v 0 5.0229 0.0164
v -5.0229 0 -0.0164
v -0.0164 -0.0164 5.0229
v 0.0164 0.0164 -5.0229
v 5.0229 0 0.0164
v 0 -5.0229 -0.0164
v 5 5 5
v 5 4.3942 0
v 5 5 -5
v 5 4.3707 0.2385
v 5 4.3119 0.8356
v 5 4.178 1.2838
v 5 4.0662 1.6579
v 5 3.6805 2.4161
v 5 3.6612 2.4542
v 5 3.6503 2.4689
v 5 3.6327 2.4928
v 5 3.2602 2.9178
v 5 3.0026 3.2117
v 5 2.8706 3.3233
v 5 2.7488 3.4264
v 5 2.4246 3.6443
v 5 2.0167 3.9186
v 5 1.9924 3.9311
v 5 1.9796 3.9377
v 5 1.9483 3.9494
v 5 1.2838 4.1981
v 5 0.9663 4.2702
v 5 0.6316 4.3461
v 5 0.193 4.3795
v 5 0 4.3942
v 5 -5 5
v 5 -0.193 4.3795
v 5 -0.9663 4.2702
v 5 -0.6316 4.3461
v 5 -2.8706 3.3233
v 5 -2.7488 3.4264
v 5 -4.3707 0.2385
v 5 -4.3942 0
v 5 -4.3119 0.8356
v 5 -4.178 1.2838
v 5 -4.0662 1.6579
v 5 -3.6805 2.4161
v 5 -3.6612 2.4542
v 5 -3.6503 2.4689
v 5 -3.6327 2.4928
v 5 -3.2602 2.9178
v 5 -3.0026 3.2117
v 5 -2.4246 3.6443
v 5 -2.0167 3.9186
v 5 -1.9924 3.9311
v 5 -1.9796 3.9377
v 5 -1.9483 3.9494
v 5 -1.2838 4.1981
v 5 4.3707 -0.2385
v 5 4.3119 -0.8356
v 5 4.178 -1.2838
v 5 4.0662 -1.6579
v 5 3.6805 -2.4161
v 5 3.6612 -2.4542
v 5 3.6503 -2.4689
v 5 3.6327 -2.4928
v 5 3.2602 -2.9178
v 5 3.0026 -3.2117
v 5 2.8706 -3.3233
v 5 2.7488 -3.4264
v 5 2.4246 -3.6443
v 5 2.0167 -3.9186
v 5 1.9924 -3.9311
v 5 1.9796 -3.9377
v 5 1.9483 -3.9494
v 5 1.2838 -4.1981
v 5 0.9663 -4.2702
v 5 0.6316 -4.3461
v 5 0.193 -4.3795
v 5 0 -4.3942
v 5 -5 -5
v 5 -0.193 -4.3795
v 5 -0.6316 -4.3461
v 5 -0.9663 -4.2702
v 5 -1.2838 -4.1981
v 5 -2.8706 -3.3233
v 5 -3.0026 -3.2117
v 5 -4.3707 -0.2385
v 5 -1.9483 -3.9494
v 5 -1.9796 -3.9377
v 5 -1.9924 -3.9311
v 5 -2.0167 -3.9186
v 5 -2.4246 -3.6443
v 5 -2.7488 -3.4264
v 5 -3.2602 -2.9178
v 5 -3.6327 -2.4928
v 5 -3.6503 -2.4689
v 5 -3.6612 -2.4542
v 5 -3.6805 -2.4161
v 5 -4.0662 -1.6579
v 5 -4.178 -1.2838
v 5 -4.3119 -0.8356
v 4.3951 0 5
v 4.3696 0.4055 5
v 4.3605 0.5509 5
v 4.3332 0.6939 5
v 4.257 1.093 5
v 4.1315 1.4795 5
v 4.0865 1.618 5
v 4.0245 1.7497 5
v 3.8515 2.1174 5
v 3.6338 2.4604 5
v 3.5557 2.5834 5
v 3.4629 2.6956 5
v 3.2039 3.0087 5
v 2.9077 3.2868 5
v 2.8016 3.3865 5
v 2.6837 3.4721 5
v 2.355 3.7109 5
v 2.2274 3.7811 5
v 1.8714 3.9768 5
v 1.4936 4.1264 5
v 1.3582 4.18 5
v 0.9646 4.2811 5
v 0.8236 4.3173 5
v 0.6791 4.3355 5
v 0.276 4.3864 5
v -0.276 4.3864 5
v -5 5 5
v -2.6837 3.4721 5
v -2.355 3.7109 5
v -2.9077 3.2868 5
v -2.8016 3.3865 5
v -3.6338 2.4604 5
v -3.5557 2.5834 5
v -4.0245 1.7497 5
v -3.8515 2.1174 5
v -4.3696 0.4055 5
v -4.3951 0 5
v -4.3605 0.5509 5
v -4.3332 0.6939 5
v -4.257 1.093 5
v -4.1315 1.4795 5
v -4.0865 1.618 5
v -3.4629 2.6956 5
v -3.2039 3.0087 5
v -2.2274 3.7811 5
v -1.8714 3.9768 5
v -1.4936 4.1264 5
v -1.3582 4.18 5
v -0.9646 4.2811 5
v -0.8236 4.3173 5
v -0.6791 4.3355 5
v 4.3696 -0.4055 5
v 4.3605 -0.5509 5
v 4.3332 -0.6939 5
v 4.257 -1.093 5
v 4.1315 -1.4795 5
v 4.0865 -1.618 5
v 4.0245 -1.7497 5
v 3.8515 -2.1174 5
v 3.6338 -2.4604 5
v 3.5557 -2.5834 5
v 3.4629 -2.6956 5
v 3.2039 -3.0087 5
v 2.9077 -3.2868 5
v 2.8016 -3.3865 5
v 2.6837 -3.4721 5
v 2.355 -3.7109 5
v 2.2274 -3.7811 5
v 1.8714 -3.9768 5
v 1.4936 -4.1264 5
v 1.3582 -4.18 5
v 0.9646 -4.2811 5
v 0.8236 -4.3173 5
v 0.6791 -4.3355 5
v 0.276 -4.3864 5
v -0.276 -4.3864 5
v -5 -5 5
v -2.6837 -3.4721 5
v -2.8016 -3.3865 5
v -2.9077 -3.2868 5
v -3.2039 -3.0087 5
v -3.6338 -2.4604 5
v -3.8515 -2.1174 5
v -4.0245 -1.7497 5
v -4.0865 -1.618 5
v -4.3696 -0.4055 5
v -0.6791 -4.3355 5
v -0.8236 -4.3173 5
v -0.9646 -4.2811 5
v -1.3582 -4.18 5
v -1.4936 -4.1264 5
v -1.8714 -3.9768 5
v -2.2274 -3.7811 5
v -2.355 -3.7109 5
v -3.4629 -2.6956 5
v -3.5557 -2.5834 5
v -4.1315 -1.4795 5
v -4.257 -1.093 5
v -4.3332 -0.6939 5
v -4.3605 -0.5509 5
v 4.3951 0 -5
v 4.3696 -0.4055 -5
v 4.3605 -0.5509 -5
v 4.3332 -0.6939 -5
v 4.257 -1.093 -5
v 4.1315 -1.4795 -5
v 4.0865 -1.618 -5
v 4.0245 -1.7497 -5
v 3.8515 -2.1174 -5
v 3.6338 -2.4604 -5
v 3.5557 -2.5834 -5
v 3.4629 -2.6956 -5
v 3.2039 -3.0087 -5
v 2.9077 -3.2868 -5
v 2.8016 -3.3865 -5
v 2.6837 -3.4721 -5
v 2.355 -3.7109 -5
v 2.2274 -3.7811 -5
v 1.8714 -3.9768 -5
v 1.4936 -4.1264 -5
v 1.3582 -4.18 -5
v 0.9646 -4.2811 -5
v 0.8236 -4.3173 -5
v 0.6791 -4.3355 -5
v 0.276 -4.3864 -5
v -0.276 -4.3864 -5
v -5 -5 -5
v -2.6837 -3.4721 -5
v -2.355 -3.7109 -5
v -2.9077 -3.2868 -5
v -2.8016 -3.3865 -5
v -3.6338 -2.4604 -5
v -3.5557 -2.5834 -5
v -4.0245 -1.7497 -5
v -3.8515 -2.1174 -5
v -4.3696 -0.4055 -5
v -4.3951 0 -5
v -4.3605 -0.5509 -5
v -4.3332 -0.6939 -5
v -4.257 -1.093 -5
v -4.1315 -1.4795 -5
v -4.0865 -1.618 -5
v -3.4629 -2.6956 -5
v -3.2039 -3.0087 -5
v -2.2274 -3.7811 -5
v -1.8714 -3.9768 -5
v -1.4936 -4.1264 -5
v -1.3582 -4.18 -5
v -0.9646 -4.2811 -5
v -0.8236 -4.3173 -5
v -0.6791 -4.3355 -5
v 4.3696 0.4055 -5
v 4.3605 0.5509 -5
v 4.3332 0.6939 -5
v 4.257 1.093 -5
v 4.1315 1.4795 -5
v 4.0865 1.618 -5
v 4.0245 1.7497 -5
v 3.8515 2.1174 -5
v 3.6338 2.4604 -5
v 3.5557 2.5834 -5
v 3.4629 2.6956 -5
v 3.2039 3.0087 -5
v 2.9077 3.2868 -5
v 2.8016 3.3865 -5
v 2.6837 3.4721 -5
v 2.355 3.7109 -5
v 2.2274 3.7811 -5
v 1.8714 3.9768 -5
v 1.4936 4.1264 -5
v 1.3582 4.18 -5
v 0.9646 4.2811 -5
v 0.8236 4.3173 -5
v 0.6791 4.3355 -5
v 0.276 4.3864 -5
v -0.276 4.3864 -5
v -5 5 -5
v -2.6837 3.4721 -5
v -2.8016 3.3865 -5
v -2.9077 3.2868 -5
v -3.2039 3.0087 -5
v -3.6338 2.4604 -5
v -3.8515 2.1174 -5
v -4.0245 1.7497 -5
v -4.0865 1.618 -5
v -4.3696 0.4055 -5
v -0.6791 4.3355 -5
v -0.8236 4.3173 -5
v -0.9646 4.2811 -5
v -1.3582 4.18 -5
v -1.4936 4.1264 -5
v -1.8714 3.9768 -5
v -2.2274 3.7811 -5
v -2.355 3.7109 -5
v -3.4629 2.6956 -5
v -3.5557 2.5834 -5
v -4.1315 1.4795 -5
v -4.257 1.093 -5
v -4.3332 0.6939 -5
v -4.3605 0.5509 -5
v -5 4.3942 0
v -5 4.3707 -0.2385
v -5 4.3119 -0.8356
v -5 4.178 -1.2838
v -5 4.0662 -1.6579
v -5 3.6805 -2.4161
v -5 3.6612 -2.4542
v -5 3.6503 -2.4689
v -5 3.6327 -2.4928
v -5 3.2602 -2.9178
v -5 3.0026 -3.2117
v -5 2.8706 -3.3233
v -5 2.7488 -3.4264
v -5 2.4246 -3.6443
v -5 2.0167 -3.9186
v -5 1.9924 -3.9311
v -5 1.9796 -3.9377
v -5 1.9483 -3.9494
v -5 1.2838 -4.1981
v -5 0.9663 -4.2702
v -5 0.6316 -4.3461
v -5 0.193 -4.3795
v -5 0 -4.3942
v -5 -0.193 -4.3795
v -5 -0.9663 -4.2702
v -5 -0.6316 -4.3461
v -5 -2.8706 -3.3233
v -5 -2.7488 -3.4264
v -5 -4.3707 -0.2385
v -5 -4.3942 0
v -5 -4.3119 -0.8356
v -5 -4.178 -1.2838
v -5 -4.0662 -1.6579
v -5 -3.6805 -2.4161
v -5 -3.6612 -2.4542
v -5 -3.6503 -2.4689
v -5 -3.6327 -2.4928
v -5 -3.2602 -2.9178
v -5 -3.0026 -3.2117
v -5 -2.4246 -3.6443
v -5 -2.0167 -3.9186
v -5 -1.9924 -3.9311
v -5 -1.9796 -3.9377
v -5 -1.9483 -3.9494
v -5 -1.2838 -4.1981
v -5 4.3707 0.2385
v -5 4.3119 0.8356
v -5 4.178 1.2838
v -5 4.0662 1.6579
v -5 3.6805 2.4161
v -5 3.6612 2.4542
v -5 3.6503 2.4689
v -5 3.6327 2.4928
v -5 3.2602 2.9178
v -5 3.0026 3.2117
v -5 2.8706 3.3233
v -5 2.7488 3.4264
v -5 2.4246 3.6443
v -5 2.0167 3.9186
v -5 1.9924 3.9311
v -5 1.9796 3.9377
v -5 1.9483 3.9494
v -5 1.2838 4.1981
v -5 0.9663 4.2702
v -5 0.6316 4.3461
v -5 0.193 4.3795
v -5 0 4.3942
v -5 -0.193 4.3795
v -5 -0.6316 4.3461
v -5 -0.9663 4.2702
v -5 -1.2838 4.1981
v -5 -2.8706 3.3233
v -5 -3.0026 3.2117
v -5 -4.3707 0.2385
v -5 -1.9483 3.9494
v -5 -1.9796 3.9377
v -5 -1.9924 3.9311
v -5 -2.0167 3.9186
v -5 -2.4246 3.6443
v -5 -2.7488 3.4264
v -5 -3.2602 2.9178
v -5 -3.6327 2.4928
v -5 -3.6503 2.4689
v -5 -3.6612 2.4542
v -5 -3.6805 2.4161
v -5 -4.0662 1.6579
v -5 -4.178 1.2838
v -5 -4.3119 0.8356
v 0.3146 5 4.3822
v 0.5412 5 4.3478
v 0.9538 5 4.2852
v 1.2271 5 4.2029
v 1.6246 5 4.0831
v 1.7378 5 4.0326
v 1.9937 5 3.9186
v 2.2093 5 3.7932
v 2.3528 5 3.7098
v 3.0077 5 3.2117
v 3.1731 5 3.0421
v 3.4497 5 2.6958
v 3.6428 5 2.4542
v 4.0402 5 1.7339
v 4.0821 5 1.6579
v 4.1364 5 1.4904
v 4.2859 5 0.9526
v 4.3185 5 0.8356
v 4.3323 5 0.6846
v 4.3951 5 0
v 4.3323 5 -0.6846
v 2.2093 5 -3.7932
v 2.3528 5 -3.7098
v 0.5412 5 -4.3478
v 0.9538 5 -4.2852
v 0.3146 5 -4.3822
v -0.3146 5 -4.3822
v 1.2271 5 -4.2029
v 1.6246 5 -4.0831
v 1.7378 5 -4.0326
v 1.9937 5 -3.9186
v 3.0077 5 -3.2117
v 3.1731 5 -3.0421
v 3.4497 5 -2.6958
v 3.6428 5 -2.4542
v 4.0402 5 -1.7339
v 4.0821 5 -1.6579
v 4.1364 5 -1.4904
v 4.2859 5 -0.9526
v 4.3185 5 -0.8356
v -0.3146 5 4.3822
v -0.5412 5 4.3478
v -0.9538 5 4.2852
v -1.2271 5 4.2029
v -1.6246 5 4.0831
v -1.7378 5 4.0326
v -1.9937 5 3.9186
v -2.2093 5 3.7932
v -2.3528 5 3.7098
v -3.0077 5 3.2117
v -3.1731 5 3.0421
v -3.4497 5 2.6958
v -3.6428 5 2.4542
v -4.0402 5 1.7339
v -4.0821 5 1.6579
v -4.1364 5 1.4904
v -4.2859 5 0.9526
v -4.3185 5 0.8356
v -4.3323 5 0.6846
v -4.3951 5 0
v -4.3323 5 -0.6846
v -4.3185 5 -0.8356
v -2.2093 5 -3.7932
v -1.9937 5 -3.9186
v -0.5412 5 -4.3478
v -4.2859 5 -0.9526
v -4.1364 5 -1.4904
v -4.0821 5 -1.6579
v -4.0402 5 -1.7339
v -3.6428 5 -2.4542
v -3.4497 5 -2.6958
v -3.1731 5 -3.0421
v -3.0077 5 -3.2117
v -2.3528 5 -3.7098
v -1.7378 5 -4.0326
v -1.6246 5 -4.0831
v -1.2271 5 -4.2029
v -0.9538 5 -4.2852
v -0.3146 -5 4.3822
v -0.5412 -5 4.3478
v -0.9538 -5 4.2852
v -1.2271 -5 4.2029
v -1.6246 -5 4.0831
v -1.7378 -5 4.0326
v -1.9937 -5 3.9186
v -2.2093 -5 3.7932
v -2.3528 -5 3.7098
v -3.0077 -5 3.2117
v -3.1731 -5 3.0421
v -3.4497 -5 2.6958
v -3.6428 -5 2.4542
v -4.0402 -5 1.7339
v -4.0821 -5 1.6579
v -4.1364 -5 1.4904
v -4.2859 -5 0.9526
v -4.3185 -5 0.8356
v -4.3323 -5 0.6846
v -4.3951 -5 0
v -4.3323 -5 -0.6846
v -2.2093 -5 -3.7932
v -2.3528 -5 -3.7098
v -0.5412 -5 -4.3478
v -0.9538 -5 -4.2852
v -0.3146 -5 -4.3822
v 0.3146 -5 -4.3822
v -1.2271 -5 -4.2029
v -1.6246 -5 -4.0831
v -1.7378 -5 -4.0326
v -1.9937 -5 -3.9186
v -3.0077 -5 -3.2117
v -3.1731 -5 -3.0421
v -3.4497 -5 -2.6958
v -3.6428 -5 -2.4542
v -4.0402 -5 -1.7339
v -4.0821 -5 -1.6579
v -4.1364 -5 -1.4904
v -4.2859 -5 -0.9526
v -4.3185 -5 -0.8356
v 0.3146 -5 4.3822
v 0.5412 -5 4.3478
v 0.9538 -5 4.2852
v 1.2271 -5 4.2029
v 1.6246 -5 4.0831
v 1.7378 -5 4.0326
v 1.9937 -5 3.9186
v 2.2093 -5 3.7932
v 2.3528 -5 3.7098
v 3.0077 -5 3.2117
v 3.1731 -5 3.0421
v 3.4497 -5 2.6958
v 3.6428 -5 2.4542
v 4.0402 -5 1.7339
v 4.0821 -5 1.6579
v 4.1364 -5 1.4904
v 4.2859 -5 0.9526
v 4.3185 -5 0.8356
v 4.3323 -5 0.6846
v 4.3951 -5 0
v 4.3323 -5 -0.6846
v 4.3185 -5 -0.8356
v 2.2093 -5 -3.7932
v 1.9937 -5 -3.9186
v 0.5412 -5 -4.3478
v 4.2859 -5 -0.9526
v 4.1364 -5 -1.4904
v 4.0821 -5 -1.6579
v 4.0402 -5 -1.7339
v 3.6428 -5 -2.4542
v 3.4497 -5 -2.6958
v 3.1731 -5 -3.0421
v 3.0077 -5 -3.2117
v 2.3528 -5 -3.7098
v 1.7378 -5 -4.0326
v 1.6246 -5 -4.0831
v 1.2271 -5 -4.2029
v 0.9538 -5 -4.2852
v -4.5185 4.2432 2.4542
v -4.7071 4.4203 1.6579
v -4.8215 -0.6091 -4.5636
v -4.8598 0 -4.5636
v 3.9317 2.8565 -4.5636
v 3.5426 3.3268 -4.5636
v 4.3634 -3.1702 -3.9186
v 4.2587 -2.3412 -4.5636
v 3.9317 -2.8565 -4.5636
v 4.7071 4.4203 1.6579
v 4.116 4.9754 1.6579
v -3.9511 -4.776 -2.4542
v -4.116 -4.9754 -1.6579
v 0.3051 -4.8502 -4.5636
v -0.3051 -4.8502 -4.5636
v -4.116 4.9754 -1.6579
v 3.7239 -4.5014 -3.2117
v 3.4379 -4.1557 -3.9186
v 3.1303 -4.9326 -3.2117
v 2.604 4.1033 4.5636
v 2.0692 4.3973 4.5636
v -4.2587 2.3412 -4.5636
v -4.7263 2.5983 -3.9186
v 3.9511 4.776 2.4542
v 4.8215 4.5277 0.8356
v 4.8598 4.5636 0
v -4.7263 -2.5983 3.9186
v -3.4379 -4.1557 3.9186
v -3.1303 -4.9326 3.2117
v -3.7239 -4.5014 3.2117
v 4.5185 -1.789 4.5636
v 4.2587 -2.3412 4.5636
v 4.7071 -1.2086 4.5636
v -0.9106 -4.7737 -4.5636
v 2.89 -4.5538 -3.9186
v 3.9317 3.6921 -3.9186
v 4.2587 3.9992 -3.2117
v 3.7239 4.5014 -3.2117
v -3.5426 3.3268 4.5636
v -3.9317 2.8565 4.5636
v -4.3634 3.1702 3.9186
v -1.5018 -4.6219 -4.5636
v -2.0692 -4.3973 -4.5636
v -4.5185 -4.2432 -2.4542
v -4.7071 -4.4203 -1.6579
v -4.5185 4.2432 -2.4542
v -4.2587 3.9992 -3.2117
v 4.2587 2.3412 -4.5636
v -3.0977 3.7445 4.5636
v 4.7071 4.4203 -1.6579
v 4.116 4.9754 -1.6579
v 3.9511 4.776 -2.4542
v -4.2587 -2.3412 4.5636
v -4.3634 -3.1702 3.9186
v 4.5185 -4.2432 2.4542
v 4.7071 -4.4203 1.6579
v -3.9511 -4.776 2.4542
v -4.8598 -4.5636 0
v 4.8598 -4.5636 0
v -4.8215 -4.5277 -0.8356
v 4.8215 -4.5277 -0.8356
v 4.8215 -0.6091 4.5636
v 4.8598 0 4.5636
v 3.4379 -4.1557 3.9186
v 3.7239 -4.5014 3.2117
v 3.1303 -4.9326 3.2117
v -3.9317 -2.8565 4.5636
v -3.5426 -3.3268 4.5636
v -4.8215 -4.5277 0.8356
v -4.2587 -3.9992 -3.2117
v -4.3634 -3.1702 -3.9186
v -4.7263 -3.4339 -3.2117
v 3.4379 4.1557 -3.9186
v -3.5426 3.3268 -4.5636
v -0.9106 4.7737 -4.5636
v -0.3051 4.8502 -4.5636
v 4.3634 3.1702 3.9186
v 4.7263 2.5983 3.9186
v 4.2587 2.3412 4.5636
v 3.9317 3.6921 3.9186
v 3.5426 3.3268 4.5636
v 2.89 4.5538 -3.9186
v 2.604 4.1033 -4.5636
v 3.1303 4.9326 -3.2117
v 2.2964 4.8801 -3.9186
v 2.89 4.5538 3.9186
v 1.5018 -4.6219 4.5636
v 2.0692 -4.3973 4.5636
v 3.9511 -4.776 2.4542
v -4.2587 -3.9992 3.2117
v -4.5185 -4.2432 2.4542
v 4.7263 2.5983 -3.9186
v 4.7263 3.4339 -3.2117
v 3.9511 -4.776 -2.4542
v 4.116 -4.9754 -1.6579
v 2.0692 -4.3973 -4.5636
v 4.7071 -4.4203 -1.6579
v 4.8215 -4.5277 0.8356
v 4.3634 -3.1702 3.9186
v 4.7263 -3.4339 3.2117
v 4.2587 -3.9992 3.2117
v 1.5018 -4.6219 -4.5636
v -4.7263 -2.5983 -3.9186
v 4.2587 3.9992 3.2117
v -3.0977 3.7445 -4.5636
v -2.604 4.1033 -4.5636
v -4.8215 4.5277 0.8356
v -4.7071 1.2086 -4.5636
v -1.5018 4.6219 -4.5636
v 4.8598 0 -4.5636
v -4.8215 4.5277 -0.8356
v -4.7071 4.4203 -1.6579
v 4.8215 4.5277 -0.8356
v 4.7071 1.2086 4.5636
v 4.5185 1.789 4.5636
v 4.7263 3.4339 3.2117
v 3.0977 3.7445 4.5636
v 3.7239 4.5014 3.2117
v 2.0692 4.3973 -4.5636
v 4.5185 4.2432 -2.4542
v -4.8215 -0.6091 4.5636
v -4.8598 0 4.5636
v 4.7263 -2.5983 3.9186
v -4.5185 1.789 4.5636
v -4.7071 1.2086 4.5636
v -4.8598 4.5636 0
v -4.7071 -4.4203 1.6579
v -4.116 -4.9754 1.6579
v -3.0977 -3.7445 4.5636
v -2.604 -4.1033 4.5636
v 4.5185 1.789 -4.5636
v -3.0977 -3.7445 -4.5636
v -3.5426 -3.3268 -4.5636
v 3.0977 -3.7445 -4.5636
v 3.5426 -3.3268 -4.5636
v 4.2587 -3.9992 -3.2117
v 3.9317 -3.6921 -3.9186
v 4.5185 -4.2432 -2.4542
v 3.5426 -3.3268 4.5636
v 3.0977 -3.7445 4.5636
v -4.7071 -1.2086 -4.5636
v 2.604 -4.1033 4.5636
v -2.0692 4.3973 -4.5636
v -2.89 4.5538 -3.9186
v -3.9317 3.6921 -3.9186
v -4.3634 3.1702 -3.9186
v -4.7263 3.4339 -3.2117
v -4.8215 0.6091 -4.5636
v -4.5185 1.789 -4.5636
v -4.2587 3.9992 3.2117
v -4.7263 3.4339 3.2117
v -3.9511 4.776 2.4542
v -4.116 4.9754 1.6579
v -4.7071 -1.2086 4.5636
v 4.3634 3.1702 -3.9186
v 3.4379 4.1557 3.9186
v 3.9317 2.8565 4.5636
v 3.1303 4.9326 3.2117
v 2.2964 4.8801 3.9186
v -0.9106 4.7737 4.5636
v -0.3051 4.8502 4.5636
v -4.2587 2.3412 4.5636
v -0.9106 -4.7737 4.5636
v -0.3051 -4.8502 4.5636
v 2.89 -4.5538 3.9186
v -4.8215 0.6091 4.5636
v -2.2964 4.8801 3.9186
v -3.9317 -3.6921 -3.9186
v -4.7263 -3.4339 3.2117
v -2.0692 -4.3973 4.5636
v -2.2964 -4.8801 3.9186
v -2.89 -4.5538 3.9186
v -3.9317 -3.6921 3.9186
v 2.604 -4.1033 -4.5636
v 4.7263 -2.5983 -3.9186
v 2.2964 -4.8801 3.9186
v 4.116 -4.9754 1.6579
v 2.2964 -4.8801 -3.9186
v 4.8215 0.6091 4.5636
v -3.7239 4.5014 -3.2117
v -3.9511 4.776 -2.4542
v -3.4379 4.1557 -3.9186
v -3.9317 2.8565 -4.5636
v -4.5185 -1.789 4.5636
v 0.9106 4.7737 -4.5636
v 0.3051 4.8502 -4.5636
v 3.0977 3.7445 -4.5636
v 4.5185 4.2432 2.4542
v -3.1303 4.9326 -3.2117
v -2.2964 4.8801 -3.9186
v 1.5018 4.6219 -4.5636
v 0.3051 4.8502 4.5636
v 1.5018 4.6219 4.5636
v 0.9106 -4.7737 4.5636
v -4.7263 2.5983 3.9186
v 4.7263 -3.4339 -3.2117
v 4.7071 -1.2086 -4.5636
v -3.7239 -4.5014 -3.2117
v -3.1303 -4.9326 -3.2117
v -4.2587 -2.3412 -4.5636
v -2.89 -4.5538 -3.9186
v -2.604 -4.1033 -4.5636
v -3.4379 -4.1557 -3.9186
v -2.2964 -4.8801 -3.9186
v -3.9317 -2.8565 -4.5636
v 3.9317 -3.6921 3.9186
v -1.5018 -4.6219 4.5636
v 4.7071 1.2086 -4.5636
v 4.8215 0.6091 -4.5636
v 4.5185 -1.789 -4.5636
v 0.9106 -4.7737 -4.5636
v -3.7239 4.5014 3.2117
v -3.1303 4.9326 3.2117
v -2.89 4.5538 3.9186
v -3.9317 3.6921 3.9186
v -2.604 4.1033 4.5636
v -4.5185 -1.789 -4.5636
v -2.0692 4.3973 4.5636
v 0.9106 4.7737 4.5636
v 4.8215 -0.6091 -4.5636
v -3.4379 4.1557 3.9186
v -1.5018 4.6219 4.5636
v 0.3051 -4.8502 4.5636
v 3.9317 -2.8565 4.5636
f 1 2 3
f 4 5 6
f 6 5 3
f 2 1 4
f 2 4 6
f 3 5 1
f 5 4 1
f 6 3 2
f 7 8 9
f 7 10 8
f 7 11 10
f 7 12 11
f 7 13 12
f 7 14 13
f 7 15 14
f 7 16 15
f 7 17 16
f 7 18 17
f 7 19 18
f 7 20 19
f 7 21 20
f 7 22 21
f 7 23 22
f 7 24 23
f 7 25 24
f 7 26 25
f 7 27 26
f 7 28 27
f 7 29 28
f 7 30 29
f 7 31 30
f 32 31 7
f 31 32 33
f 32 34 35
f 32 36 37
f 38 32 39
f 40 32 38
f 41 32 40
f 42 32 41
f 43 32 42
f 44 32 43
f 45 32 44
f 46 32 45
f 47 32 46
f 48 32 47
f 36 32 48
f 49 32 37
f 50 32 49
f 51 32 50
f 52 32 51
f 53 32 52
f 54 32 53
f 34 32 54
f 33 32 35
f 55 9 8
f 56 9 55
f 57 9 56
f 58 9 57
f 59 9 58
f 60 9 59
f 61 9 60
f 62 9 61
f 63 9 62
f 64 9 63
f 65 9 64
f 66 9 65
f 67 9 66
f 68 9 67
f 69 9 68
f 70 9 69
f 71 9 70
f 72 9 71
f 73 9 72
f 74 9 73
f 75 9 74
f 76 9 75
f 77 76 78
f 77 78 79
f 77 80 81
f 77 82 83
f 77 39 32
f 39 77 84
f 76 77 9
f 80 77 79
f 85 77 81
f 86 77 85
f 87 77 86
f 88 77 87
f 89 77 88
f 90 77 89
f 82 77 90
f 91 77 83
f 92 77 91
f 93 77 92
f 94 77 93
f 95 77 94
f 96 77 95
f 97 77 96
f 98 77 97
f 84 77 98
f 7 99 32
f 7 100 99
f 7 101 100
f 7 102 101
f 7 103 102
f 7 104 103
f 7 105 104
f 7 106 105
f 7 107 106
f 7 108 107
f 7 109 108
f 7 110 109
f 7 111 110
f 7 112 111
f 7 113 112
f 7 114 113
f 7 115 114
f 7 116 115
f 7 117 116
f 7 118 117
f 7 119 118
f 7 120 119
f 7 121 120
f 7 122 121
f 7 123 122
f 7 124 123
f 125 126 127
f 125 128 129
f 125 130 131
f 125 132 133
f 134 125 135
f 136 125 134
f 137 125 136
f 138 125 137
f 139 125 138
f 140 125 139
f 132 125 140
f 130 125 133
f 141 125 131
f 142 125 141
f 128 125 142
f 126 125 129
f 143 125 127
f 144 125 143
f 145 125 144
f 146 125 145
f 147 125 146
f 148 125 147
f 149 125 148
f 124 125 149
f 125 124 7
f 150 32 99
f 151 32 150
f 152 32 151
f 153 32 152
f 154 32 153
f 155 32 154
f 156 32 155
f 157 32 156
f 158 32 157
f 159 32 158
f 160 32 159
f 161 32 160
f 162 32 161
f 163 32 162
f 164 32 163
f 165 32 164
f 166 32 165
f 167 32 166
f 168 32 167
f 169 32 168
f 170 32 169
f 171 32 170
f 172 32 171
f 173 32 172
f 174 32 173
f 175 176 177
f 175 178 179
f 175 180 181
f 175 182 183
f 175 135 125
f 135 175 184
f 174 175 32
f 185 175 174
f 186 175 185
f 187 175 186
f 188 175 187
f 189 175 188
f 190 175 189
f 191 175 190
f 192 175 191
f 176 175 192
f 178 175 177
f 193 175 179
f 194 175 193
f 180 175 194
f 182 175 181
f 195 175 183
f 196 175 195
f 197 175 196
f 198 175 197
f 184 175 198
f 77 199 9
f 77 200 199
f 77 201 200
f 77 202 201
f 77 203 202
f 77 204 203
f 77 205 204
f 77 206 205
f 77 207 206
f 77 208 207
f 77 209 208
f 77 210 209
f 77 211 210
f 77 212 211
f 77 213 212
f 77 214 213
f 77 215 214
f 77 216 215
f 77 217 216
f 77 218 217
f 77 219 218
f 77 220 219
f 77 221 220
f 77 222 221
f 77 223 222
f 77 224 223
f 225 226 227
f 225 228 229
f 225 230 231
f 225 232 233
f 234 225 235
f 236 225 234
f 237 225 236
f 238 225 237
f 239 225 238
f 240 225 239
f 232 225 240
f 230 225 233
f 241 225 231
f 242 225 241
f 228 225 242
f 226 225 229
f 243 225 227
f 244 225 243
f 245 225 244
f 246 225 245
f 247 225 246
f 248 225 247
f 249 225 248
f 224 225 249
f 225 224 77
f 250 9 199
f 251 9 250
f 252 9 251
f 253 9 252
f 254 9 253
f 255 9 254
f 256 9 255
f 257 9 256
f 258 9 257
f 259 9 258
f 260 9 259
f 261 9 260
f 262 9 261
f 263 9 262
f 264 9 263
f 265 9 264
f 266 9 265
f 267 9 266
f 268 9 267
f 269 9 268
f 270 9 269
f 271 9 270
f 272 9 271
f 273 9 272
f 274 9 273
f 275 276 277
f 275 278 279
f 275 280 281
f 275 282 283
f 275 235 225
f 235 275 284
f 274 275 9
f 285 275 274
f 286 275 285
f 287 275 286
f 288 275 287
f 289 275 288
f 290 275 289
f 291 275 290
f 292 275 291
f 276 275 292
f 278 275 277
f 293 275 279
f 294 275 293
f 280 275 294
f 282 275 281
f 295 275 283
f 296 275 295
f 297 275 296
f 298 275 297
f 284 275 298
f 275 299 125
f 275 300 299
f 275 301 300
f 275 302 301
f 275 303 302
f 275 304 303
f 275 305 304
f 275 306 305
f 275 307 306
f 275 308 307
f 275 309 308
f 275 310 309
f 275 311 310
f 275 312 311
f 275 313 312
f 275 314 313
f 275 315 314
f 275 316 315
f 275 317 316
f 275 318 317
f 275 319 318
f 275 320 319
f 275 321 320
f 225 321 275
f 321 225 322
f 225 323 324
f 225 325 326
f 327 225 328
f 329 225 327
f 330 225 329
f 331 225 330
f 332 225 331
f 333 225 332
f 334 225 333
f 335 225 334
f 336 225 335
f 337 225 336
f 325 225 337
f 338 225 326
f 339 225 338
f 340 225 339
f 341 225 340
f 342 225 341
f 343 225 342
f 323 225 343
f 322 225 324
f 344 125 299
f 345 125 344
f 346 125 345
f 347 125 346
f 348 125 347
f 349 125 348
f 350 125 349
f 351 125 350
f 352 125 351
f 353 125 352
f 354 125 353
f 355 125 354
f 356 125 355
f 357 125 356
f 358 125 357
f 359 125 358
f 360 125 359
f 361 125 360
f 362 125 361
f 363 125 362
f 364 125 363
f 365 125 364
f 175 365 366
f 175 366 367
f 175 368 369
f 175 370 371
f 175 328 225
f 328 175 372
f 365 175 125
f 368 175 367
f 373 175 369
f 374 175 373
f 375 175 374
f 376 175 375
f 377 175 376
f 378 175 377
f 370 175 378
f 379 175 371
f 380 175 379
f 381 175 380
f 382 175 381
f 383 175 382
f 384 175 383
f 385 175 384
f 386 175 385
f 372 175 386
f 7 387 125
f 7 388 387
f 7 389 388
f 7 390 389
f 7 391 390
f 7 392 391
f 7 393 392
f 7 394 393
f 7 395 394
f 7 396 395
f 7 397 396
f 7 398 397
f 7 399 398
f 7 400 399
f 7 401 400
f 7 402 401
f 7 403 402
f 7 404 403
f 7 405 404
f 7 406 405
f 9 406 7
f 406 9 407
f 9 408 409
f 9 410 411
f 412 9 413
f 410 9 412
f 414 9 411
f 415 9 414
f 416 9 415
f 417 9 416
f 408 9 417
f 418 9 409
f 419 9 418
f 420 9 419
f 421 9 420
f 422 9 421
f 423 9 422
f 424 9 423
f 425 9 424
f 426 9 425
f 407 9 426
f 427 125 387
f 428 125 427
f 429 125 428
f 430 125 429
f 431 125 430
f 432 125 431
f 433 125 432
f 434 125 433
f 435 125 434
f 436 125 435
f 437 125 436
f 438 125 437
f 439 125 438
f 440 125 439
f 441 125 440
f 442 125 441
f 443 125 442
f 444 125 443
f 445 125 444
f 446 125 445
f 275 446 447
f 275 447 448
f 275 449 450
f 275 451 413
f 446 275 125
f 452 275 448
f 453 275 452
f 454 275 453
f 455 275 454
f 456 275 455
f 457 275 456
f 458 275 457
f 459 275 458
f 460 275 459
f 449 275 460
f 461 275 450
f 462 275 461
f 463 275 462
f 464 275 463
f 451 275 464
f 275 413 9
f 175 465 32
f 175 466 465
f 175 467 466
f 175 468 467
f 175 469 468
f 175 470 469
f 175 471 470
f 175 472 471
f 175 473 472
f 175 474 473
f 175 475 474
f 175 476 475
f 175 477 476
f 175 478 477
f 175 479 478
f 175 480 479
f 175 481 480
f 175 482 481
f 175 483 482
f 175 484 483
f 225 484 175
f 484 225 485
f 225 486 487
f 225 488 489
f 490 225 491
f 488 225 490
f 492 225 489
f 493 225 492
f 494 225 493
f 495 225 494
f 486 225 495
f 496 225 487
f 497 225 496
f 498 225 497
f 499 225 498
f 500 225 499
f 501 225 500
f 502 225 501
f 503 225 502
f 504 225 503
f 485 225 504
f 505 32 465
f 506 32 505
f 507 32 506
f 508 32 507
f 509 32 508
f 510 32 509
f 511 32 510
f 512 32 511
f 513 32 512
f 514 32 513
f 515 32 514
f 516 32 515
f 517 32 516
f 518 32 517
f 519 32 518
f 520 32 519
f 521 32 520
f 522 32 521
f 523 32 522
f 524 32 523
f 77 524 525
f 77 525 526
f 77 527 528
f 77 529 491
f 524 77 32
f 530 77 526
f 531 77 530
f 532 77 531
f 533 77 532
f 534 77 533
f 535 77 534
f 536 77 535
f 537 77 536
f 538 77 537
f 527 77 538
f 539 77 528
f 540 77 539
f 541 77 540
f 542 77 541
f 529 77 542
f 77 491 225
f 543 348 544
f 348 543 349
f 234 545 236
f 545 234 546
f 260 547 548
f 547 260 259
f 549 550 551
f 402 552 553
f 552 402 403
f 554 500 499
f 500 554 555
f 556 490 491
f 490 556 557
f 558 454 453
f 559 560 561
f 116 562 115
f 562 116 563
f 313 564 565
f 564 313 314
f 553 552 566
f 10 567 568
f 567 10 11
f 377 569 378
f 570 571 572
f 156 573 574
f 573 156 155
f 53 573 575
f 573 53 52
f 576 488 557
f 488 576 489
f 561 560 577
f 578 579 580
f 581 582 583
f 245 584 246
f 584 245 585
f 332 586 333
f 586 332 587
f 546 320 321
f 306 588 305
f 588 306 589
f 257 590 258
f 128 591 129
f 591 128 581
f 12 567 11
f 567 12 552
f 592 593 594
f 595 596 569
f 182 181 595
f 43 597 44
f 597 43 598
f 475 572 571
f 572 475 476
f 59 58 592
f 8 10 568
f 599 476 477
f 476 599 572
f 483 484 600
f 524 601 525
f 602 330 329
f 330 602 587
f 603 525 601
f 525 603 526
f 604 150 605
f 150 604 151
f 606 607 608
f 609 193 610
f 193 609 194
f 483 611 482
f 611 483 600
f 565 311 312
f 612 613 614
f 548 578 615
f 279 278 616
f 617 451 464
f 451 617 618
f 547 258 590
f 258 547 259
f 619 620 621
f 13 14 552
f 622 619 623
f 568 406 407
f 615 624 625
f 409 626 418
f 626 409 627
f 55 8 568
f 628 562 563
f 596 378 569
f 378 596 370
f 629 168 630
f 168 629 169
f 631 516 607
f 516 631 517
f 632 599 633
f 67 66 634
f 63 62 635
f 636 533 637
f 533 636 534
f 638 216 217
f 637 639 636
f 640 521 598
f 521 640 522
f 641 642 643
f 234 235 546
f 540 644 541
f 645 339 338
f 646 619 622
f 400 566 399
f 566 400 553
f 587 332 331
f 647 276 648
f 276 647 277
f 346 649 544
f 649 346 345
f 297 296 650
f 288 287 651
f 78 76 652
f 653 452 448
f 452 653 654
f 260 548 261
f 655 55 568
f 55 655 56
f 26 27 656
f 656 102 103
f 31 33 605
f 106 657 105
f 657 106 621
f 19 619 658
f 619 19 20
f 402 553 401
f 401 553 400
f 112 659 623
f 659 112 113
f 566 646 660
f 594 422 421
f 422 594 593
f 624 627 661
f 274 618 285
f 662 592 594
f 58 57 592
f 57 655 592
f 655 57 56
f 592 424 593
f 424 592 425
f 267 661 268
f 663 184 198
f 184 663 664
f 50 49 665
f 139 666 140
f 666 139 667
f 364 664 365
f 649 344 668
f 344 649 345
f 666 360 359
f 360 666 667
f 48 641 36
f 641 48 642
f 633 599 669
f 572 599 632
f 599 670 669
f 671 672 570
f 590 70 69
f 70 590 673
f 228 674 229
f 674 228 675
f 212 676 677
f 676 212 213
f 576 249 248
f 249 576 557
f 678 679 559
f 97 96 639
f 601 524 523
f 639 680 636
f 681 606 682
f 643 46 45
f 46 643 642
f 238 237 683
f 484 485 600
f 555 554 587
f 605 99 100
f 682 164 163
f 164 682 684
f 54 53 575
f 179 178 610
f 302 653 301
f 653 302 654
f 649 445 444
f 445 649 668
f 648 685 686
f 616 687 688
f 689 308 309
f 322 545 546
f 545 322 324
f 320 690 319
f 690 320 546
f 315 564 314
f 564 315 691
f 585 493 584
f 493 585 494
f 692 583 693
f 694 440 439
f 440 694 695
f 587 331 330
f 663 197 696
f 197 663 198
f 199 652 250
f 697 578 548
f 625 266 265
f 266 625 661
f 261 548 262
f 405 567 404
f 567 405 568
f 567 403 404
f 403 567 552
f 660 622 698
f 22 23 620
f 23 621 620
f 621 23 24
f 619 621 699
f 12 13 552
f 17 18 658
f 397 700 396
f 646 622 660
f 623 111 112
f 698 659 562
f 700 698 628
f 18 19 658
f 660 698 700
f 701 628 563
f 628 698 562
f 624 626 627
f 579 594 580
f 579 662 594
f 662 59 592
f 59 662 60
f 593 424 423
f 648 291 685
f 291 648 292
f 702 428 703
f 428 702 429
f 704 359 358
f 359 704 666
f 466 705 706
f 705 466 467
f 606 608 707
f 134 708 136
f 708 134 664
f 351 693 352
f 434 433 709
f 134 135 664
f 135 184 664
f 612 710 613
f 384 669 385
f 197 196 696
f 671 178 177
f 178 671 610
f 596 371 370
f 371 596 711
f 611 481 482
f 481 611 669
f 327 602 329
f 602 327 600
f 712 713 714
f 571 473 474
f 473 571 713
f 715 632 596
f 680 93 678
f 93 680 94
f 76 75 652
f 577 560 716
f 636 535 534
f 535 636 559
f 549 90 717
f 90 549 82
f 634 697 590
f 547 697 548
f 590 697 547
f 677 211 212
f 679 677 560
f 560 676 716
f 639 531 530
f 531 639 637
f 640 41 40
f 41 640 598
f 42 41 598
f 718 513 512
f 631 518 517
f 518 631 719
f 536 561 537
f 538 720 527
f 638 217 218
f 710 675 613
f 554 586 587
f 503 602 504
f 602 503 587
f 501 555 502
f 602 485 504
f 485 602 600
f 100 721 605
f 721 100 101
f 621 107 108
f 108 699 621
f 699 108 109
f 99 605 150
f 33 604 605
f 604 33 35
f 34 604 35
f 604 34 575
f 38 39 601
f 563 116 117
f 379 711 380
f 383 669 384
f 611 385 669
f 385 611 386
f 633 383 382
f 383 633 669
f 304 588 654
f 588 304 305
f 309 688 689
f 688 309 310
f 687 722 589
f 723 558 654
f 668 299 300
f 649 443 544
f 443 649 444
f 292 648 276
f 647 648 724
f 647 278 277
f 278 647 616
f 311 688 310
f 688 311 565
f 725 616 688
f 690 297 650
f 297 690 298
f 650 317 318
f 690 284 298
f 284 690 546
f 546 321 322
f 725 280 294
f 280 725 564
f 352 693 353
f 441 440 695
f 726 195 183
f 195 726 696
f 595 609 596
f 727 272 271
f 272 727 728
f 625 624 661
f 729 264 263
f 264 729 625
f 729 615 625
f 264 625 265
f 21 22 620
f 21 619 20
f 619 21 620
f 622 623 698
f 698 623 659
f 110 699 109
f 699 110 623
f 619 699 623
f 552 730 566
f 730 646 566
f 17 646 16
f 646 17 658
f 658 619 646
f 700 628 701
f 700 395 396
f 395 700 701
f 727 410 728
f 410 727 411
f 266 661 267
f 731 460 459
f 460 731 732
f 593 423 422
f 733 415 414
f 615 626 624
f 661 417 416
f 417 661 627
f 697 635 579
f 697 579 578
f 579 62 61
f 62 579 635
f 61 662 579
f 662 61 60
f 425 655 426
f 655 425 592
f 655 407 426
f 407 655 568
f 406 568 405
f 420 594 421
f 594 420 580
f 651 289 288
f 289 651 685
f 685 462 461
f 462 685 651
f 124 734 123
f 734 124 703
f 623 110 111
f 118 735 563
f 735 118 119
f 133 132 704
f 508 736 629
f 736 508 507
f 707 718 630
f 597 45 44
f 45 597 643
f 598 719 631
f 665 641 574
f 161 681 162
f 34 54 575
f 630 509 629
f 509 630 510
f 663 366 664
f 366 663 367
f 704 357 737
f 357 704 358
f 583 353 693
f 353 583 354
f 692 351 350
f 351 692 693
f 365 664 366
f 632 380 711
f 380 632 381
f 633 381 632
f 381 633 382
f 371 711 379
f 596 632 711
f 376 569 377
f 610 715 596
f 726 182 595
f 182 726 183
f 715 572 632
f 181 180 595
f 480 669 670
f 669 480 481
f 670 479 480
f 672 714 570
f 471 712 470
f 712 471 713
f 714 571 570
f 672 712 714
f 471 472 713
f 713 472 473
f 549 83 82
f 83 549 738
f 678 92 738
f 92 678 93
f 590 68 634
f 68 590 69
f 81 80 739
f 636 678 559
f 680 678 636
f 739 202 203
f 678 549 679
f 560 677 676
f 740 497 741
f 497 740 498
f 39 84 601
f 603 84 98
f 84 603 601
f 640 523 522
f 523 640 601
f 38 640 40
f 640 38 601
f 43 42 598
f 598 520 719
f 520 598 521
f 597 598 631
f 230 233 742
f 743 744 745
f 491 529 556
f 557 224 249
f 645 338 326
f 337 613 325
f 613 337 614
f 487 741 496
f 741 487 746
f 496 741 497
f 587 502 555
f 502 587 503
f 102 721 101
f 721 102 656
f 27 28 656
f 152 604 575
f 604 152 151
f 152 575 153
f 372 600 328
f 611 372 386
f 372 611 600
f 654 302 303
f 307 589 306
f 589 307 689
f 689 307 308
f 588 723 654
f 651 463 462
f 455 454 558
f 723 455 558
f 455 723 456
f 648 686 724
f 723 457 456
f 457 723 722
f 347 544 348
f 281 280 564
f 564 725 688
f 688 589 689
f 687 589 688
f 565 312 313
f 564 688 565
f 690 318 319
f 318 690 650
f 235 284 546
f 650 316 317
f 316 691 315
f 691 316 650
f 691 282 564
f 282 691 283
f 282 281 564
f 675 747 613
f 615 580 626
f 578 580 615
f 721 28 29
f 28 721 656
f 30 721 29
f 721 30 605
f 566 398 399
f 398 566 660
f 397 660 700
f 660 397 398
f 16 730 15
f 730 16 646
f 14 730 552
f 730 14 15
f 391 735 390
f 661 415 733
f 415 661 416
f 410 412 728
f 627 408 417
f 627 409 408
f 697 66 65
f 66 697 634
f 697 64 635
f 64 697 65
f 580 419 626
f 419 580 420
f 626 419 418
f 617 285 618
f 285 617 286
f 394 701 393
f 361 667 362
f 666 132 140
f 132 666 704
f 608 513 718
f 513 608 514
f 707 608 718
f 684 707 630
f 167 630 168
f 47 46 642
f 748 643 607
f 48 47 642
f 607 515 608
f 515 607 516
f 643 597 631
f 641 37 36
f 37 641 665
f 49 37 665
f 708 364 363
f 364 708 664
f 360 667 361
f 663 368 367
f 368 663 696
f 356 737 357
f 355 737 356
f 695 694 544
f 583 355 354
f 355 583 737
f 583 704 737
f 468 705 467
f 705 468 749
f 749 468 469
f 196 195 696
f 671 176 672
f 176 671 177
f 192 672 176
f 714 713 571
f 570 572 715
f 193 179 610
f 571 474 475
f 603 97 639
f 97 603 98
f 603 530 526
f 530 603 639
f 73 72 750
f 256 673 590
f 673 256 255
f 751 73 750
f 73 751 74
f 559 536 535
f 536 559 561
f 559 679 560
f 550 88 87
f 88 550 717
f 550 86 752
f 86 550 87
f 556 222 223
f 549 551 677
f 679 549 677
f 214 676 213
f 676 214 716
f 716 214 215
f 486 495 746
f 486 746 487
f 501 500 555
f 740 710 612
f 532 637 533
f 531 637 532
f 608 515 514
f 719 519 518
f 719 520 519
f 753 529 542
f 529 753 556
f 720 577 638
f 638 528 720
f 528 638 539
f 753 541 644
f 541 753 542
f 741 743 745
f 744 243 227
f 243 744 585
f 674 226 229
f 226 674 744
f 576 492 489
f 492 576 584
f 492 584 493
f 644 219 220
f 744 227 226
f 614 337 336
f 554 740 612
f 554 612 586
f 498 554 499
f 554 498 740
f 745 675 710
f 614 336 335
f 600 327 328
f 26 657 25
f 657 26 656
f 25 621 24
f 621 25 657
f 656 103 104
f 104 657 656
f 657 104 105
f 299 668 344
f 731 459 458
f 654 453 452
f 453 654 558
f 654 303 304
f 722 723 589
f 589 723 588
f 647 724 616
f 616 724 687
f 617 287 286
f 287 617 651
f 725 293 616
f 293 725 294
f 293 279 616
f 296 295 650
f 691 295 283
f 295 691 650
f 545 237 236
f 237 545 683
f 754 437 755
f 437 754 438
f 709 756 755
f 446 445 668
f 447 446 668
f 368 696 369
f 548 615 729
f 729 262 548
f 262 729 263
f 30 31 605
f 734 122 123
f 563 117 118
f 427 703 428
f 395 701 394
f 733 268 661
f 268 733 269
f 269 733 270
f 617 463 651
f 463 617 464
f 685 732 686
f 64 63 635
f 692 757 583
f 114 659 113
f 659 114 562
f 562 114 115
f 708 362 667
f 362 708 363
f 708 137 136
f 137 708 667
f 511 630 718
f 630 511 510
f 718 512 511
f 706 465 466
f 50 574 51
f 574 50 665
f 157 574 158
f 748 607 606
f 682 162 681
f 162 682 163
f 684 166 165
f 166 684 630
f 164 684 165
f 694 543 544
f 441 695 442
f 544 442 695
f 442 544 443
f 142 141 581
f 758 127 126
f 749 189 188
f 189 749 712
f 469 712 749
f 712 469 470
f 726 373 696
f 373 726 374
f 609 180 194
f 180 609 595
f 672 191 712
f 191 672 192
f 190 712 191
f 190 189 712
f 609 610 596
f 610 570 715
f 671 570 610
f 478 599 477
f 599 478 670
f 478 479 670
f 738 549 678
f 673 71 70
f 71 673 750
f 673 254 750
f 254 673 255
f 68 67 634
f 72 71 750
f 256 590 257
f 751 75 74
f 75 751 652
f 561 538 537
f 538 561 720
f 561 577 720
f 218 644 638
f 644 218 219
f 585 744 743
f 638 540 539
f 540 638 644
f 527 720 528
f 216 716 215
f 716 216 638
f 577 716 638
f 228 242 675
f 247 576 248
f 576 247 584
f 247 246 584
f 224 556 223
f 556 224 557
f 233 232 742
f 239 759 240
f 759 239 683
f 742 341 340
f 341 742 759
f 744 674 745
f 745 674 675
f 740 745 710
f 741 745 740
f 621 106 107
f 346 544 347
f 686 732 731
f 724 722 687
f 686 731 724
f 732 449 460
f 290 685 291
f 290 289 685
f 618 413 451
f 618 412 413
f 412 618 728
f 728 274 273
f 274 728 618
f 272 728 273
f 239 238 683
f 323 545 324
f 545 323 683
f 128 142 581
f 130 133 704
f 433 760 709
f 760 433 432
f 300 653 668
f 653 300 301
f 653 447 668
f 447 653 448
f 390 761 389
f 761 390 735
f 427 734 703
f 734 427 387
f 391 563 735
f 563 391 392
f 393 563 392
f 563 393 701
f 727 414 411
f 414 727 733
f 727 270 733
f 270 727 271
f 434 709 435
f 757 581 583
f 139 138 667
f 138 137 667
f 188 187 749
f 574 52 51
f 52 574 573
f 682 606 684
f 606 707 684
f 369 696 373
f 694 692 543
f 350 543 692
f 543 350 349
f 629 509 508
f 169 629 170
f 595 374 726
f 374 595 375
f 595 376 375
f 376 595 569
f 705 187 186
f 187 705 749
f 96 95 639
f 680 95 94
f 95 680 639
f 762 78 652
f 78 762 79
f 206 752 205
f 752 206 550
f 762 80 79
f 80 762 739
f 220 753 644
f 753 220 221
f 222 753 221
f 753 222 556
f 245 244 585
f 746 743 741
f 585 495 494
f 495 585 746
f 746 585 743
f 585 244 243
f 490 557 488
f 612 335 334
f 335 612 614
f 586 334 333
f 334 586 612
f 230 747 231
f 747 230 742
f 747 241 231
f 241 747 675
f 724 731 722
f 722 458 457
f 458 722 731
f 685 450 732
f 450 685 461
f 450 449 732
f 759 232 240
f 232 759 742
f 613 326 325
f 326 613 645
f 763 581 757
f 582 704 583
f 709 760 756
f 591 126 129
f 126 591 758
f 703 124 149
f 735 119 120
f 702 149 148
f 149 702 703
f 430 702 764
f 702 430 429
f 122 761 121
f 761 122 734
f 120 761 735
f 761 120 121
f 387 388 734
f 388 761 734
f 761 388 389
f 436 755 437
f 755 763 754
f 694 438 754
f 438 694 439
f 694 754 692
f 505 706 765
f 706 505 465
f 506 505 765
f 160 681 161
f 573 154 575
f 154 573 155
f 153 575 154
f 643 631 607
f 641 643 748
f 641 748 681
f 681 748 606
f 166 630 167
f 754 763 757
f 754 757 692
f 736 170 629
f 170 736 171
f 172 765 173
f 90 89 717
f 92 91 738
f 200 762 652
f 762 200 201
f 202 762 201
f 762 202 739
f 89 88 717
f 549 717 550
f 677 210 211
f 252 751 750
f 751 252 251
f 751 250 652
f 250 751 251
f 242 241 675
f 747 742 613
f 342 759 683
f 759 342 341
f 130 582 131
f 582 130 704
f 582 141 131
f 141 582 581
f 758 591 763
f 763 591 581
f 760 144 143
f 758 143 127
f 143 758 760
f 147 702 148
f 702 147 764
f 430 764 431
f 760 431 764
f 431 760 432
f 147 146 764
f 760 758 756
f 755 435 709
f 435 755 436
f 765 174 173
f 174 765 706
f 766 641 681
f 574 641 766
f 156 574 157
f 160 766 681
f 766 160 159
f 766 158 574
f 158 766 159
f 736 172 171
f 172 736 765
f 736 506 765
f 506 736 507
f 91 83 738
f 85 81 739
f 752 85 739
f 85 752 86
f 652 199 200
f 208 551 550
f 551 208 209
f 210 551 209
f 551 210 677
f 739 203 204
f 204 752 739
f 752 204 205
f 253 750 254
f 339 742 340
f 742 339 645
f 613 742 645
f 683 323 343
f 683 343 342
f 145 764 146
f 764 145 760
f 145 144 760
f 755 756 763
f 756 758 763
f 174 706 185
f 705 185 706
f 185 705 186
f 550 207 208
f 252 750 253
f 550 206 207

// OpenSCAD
$fn = 50;

module opencube(size) {
    difference() {
        cube(size, center=true);
        sphere(size*2/3);
    }
}

module box(size) {
    cube([2*size, 2*size, size], center = true); 
}

module octahedron(size) {
    rotate([125,0,135]) {
        dihedral = 109.47122;
        n = 3;
        intersection(){
            box(size);
            intersection_for(i=[1:n])  { 
                rotate([dihedral, 0, 360 /n * i])  box(size); 
           }
        }
    }
}

octahedron(5.8);

opencube(10);
